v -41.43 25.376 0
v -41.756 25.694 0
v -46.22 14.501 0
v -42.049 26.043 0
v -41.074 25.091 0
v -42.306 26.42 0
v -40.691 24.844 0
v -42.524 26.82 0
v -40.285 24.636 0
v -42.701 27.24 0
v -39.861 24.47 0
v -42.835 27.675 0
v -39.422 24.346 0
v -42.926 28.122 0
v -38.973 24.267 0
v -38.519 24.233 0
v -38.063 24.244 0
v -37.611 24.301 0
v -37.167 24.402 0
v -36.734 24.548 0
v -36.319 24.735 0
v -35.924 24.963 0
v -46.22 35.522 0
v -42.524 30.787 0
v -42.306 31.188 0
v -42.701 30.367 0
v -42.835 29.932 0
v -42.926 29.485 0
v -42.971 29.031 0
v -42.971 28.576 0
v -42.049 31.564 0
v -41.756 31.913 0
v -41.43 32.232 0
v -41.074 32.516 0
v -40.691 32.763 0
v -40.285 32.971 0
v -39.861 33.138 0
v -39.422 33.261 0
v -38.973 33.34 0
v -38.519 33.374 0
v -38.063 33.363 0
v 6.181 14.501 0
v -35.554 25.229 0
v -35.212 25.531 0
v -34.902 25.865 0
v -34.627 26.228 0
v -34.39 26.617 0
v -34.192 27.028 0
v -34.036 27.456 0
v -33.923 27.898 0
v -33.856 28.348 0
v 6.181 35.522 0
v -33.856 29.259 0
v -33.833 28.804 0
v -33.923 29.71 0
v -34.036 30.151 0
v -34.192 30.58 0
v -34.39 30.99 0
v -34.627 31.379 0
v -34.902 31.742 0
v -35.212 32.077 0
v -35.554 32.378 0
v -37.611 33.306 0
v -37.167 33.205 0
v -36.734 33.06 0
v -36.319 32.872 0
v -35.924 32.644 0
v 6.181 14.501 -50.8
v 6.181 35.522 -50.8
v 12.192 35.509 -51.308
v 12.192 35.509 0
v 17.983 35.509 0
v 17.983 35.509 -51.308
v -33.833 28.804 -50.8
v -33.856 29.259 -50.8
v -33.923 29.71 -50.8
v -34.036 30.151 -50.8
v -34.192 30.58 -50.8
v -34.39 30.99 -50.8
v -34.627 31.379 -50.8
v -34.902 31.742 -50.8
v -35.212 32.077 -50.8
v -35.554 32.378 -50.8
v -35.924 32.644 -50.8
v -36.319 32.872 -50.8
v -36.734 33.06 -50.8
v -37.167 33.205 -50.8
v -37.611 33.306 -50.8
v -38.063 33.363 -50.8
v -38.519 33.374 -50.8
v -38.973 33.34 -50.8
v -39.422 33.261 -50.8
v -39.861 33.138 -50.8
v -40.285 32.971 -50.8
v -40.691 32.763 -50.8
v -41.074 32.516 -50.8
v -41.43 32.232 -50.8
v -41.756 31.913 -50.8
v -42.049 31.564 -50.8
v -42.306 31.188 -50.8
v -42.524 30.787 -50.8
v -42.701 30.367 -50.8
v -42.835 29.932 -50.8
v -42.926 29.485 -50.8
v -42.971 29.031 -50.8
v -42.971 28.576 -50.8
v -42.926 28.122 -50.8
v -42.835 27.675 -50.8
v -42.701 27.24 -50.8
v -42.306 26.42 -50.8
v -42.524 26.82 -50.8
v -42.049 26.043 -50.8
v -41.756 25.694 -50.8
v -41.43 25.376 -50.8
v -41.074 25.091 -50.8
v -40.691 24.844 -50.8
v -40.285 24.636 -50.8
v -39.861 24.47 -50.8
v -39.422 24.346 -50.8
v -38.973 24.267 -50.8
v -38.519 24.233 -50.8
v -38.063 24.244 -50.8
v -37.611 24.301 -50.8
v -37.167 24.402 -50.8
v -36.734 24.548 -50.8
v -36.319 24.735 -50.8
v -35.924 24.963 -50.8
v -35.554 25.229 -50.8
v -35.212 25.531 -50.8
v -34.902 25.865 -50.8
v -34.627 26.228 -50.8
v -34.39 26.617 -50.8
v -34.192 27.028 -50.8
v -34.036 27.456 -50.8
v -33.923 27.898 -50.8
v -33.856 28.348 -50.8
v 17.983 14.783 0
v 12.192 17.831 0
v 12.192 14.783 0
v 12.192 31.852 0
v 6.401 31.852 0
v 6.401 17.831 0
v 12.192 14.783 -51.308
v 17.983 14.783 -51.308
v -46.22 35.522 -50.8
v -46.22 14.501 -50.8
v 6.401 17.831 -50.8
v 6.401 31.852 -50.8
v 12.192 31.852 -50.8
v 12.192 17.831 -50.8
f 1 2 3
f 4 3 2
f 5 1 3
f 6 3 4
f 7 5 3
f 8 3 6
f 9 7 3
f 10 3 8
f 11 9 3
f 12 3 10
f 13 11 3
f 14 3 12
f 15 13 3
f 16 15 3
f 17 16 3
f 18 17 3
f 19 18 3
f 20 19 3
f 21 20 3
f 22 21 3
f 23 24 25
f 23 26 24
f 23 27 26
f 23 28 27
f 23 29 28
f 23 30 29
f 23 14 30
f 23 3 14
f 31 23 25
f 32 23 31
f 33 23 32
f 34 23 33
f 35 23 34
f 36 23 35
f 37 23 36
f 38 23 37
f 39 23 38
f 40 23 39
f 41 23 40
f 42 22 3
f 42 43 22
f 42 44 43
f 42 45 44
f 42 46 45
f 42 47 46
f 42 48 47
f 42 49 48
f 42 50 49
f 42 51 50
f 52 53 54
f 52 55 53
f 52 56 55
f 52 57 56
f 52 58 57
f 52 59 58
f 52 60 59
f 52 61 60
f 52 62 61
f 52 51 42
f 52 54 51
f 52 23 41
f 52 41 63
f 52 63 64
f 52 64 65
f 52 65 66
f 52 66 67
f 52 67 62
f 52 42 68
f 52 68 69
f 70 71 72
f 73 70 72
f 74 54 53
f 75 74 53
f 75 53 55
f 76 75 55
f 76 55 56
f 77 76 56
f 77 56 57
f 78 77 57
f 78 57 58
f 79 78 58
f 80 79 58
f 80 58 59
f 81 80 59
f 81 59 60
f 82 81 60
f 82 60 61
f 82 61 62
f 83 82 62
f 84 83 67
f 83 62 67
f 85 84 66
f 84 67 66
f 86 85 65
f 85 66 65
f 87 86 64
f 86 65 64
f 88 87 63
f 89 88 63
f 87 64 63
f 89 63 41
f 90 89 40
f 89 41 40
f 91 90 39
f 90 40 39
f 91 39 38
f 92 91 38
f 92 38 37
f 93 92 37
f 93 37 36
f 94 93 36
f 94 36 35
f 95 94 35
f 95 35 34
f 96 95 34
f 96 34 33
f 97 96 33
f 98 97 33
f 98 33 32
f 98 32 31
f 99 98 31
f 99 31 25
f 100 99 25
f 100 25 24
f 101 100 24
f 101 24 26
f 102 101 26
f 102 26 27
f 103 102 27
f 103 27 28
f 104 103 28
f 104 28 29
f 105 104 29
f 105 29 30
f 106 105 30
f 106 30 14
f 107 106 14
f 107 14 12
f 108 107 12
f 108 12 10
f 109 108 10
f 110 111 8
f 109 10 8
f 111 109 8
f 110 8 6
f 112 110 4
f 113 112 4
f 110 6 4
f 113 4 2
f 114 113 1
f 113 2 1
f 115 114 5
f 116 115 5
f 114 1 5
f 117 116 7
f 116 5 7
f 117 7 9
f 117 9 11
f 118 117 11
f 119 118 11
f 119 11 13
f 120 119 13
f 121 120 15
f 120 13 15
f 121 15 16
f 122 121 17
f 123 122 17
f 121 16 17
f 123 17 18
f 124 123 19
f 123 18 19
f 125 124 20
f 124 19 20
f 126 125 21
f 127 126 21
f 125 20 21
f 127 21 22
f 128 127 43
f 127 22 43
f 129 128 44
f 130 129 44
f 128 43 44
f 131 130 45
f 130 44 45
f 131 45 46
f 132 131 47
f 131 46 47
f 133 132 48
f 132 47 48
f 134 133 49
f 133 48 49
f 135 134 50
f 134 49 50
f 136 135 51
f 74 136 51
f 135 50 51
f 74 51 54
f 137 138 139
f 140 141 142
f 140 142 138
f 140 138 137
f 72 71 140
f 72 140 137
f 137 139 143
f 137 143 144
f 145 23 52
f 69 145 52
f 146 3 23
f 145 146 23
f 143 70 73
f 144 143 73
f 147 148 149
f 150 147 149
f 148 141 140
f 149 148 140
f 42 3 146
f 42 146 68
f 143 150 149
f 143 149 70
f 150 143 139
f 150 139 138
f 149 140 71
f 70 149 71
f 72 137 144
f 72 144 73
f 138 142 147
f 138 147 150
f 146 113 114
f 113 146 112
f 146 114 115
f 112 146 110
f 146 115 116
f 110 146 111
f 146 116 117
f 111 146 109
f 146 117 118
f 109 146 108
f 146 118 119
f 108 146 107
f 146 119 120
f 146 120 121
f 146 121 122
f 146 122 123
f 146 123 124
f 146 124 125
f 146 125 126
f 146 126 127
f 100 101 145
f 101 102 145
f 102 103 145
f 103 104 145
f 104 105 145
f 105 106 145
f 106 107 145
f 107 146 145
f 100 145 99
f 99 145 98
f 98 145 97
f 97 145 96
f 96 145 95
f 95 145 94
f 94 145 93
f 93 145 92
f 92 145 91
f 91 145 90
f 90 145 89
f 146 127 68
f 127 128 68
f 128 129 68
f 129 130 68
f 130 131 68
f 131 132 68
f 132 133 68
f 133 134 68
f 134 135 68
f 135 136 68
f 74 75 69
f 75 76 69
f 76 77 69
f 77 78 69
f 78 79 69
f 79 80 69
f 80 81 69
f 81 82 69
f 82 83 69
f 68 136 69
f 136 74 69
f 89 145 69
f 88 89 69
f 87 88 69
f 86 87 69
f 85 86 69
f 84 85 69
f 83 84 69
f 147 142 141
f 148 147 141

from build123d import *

# Parameters (mm, degrees)
F0_W      = 29.1494224221
F0_H      = 37.5785604119
F1_DEPTH  = 25.4
F3_W      = 52.4003743194
F3_H      = 21.0210764781
F4_DEPTH  = 50.8
F5_R      = 4.5719996095
F6_DEPTH  = 75.438
F7_W      = 5.7911989279
F7_H      = 14.0208043158
F9_DEPTH  = 50.8
F8_W      = 5.7911993936
F8_H      = 20.7264022902
F10_DEPTH = 51.308


with BuildPart() as f1:
    # F0 (on Top) → F1 (new body)
    with BuildSketch(Plane.XY):
        with Locations((-28.6207711324, -18.789280206)):
            Rectangle(F0_W, F0_H)
    extrude(amount=F1_DEPTH)


with BuildPart() as f4:
    # F3 (on Top) → F4 (new body)
    with BuildSketch(Plane.XY):
        with Locations((-20.0193629134, 25.0117140822)):
            Rectangle(F3_W, F3_H)
    extrude(amount=-F4_DEPTH)

    # F5 (on face) → F6 (cut)
    with BuildSketch(Plane.XY):
        with Locations((-38.4047999978, 28.803601861)):
            Circle(F5_R)
    extrude(amount=-F6_DEPTH, mode=Mode.SUBTRACT)


with BuildPart() as f9:
    # F7 (on Top) → F9 (new body, through all)
    with BuildSketch(Plane.XY):
        with Locations((9.296401171, 24.841202423)):
            Rectangle(F7_W, F7_H)
    extrude(amount=-F9_DEPTH)

    # F8 (on Top) → F10 (join)
    with BuildSketch(Plane.XY):
        with Locations((15.0876003318, 25.1460014842)):
            Rectangle(F8_W, F8_H)
    extrude(amount=-F10_DEPTH)


solid = Compound([f4.part, f9.part])
